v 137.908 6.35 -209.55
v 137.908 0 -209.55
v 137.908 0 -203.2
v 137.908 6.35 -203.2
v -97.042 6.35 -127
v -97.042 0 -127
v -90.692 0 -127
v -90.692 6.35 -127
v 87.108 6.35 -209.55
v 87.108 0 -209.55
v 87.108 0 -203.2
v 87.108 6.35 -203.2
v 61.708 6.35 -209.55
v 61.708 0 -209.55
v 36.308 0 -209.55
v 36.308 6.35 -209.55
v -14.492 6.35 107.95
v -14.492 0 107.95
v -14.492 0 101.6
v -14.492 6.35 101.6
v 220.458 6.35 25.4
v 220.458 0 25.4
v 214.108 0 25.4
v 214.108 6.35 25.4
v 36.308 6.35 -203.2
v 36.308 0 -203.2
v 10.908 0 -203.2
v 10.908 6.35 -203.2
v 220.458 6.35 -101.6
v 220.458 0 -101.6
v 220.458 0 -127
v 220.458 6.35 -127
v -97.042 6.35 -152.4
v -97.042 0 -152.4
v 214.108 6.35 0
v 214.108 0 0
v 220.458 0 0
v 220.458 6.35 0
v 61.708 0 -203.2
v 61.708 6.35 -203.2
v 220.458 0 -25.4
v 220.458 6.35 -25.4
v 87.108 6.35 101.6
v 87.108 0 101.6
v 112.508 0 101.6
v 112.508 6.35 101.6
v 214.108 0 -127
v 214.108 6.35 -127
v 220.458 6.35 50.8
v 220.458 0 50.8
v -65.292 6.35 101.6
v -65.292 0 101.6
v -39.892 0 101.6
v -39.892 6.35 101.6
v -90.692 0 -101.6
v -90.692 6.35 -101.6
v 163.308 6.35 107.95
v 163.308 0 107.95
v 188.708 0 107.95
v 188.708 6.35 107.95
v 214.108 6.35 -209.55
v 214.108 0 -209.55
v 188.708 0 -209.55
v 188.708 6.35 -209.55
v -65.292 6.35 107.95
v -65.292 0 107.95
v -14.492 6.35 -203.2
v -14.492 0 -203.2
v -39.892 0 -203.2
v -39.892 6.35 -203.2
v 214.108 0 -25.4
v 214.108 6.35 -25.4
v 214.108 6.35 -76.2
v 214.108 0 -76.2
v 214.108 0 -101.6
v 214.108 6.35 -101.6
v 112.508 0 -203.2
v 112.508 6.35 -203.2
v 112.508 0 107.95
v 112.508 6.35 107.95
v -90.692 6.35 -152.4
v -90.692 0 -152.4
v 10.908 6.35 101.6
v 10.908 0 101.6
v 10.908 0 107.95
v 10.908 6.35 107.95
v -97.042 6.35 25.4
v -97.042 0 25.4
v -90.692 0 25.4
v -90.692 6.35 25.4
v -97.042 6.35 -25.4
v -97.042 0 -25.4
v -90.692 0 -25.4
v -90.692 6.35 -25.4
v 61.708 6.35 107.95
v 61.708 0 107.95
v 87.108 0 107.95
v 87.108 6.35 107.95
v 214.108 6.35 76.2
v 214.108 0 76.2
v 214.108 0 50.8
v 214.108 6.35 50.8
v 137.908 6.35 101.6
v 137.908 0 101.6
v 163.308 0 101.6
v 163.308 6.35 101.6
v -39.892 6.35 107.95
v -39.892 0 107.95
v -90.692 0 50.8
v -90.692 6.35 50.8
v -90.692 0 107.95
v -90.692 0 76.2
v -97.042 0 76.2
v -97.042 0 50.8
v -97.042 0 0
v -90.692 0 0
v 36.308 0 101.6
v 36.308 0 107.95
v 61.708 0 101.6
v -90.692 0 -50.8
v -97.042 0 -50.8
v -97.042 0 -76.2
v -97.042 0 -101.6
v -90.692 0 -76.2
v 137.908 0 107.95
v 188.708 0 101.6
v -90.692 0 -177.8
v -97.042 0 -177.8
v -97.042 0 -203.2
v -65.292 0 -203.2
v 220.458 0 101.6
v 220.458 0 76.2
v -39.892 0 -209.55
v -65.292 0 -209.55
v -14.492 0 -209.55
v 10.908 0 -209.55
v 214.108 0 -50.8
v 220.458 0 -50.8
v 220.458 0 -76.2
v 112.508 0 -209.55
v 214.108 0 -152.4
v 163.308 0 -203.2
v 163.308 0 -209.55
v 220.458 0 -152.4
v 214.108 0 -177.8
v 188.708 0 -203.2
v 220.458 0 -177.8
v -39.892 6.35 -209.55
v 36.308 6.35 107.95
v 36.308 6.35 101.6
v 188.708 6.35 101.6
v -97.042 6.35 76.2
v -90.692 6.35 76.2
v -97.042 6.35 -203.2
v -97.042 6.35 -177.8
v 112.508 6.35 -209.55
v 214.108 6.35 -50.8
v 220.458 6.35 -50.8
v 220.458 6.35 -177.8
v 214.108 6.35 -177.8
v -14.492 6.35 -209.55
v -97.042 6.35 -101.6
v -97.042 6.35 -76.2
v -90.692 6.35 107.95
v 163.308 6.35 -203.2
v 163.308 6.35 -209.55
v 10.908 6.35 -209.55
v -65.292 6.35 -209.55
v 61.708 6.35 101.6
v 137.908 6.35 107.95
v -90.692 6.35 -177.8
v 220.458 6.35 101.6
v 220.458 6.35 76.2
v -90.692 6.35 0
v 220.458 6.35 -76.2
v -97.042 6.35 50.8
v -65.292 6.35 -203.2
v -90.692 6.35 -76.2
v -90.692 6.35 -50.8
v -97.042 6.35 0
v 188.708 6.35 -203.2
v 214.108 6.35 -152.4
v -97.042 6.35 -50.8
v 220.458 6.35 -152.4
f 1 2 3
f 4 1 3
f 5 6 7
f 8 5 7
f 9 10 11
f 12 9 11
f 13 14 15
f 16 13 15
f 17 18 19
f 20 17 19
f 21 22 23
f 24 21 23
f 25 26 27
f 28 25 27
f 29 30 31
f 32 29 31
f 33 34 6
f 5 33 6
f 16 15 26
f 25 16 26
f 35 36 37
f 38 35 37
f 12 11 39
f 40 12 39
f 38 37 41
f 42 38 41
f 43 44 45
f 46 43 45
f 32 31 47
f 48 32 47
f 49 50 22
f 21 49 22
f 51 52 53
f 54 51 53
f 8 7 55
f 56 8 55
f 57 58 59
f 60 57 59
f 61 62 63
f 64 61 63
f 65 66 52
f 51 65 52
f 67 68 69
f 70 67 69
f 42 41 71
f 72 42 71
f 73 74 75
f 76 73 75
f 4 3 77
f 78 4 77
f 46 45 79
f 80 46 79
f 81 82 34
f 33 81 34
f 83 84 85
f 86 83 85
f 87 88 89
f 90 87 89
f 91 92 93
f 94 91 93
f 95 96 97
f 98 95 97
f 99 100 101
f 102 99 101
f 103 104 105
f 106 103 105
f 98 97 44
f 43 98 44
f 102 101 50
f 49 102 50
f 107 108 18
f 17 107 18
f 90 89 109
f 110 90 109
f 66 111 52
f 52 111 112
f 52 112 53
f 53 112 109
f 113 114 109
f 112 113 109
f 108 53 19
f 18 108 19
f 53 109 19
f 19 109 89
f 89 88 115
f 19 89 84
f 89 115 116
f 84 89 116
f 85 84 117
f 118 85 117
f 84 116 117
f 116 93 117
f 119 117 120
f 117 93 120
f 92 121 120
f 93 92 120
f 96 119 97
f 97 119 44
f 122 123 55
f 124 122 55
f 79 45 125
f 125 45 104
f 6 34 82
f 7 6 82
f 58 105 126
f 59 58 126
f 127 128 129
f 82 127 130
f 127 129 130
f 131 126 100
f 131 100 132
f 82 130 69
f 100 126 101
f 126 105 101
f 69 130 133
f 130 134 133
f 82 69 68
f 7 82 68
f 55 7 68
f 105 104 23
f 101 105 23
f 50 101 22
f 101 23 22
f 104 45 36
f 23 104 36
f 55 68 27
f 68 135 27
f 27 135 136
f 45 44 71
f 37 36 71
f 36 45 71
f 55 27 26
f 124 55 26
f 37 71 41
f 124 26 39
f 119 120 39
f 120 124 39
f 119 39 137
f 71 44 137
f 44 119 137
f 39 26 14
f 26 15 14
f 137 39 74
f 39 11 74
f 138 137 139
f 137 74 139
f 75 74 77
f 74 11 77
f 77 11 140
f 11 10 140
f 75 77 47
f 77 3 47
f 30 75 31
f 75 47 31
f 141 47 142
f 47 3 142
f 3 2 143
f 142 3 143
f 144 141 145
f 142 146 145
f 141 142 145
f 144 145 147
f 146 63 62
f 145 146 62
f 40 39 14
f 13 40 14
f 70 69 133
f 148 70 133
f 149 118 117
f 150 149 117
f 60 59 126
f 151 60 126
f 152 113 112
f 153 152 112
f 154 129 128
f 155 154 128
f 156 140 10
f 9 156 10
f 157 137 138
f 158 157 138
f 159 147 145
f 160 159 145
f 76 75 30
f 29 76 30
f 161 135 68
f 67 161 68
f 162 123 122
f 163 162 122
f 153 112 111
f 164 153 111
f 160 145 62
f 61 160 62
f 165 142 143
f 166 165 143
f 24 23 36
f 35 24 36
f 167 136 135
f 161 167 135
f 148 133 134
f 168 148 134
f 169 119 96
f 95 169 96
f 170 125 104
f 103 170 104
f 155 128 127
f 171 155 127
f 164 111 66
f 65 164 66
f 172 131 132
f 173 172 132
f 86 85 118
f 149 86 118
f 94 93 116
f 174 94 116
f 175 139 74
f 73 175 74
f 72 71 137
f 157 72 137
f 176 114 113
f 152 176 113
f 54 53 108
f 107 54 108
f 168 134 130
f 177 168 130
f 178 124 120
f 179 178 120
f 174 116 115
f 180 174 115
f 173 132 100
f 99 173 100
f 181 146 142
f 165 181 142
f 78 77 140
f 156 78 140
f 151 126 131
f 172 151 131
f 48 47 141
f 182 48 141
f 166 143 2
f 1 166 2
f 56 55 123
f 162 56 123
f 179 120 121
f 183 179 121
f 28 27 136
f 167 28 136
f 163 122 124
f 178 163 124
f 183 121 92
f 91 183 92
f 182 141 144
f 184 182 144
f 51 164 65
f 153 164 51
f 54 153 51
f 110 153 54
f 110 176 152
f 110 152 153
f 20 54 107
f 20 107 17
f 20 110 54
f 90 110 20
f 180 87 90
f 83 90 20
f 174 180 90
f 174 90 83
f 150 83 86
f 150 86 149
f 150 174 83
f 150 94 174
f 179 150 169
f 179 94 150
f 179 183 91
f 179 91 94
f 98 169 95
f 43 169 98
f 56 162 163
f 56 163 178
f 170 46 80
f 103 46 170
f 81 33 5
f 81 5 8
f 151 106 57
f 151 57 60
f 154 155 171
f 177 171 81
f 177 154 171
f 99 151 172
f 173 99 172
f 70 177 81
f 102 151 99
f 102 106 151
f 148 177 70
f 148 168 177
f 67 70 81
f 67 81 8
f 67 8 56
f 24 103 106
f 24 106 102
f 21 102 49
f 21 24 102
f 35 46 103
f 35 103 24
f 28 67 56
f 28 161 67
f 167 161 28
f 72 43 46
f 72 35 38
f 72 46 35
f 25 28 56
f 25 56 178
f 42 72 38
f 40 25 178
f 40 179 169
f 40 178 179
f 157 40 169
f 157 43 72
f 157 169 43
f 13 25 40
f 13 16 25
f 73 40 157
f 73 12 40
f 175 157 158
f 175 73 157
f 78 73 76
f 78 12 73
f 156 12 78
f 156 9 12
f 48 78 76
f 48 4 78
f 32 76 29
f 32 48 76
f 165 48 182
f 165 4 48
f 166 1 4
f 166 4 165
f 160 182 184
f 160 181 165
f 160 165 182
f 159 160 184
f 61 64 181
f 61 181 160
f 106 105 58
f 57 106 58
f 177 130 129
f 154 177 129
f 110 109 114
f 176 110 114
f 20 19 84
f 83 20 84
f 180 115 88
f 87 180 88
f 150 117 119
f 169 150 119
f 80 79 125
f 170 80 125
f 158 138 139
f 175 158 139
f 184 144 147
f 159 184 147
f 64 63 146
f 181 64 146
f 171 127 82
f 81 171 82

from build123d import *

# Parameters (mm, degrees)
BOSS_EXTRUDE1_DEPTH = 6.35


with BuildPart() as part:
    # Sketch1 → Boss-Extrude1 (new body)
    with BuildSketch(Plane(origin=(0, 0, 0), x_dir=(1, 0, 0), z_dir=(0, 1, 0))):
        Polygon((-65.292450766, -101.6), (-39.892450766, -101.6), (-39.892450766, -107.95), (-14.492450766, -107.95), (-14.492450766, -101.6), (10.907549234, -101.6), (10.907549234, -107.95), (36.307549234, -107.95), (36.307549234, -101.6), (61.707549234, -101.6), (61.707549234, -107.95), (87.107549234, -107.95), (87.107549234, -101.6), (112.507549234, -101.6), (112.507549234, -107.95), (137.907549234, -107.95), (137.907549234, -101.6), (163.307549234, -101.6), (163.307549234, -107.95), (188.707549234, -107.95), (188.707549234, -101.6), (220.457549234, -101.6), (220.457549234, -76.2), (214.107549234, -76.2), (214.107549234, -50.8), (220.457549234, -50.8), (220.457549234, -25.4), (214.107549234, -25.4), (214.107549234, 0), (220.457549234, 0), (220.457549234, 25.4), (214.107549234, 25.4), (214.107549234, 50.8), (220.457549234, 50.8), (220.457549234, 76.2), (214.107549234, 76.2), (214.107549234, 101.6), (220.457549234, 101.6), (220.457549234, 127), (214.107549234, 127), (214.107549234, 152.4), (220.457549234, 152.4), (220.457549234, 177.8), (214.107549234, 177.8), (214.107549234, 209.55), (188.707549234, 209.55), (188.707549234, 203.2), (163.307549234, 203.2), (163.307549234, 209.55), (137.907549234, 209.55), (137.907549234, 203.2), (112.507549234, 203.2), (112.507549234, 209.55), (87.107549234, 209.55), (87.107549234, 203.2), (61.707549234, 203.2), (61.707549234, 209.55), (36.307549234, 209.55), (36.307549234, 203.2), (10.907549234, 203.2), (10.907549234, 209.55), (-14.492450766, 209.55), (-14.492450766, 203.2), (-39.892450766, 203.2), (-39.892450766, 209.55), (-65.292450766, 209.55), (-65.292450766, 203.2), (-97.042450766, 203.2), (-97.042450766, 177.8), (-90.692450766, 177.8), (-90.692450766, 152.4), (-97.042450766, 152.4), (-97.042450766, 127), (-90.692450766, 127), (-90.692450766, 101.6), (-97.042450766, 101.6), (-97.042450766, 76.2), (-90.692450766, 76.2), (-90.692450766, 50.8), (-97.042450766, 50.8), (-97.042450766, 25.4), (-90.692450766, 25.4), (-90.692450766, 0), (-97.042450766, 0), (-97.042450766, -25.4), (-90.692450766, -25.4), (-90.692450766, -50.8), (-97.042450766, -50.8), (-97.042450766, -76.2), (-90.692450766, -76.2), (-90.692450766, -107.95), (-65.292450766, -107.95), align=None)
    extrude(amount=BOSS_EXTRUDE1_DEPTH)


solid = part.part
